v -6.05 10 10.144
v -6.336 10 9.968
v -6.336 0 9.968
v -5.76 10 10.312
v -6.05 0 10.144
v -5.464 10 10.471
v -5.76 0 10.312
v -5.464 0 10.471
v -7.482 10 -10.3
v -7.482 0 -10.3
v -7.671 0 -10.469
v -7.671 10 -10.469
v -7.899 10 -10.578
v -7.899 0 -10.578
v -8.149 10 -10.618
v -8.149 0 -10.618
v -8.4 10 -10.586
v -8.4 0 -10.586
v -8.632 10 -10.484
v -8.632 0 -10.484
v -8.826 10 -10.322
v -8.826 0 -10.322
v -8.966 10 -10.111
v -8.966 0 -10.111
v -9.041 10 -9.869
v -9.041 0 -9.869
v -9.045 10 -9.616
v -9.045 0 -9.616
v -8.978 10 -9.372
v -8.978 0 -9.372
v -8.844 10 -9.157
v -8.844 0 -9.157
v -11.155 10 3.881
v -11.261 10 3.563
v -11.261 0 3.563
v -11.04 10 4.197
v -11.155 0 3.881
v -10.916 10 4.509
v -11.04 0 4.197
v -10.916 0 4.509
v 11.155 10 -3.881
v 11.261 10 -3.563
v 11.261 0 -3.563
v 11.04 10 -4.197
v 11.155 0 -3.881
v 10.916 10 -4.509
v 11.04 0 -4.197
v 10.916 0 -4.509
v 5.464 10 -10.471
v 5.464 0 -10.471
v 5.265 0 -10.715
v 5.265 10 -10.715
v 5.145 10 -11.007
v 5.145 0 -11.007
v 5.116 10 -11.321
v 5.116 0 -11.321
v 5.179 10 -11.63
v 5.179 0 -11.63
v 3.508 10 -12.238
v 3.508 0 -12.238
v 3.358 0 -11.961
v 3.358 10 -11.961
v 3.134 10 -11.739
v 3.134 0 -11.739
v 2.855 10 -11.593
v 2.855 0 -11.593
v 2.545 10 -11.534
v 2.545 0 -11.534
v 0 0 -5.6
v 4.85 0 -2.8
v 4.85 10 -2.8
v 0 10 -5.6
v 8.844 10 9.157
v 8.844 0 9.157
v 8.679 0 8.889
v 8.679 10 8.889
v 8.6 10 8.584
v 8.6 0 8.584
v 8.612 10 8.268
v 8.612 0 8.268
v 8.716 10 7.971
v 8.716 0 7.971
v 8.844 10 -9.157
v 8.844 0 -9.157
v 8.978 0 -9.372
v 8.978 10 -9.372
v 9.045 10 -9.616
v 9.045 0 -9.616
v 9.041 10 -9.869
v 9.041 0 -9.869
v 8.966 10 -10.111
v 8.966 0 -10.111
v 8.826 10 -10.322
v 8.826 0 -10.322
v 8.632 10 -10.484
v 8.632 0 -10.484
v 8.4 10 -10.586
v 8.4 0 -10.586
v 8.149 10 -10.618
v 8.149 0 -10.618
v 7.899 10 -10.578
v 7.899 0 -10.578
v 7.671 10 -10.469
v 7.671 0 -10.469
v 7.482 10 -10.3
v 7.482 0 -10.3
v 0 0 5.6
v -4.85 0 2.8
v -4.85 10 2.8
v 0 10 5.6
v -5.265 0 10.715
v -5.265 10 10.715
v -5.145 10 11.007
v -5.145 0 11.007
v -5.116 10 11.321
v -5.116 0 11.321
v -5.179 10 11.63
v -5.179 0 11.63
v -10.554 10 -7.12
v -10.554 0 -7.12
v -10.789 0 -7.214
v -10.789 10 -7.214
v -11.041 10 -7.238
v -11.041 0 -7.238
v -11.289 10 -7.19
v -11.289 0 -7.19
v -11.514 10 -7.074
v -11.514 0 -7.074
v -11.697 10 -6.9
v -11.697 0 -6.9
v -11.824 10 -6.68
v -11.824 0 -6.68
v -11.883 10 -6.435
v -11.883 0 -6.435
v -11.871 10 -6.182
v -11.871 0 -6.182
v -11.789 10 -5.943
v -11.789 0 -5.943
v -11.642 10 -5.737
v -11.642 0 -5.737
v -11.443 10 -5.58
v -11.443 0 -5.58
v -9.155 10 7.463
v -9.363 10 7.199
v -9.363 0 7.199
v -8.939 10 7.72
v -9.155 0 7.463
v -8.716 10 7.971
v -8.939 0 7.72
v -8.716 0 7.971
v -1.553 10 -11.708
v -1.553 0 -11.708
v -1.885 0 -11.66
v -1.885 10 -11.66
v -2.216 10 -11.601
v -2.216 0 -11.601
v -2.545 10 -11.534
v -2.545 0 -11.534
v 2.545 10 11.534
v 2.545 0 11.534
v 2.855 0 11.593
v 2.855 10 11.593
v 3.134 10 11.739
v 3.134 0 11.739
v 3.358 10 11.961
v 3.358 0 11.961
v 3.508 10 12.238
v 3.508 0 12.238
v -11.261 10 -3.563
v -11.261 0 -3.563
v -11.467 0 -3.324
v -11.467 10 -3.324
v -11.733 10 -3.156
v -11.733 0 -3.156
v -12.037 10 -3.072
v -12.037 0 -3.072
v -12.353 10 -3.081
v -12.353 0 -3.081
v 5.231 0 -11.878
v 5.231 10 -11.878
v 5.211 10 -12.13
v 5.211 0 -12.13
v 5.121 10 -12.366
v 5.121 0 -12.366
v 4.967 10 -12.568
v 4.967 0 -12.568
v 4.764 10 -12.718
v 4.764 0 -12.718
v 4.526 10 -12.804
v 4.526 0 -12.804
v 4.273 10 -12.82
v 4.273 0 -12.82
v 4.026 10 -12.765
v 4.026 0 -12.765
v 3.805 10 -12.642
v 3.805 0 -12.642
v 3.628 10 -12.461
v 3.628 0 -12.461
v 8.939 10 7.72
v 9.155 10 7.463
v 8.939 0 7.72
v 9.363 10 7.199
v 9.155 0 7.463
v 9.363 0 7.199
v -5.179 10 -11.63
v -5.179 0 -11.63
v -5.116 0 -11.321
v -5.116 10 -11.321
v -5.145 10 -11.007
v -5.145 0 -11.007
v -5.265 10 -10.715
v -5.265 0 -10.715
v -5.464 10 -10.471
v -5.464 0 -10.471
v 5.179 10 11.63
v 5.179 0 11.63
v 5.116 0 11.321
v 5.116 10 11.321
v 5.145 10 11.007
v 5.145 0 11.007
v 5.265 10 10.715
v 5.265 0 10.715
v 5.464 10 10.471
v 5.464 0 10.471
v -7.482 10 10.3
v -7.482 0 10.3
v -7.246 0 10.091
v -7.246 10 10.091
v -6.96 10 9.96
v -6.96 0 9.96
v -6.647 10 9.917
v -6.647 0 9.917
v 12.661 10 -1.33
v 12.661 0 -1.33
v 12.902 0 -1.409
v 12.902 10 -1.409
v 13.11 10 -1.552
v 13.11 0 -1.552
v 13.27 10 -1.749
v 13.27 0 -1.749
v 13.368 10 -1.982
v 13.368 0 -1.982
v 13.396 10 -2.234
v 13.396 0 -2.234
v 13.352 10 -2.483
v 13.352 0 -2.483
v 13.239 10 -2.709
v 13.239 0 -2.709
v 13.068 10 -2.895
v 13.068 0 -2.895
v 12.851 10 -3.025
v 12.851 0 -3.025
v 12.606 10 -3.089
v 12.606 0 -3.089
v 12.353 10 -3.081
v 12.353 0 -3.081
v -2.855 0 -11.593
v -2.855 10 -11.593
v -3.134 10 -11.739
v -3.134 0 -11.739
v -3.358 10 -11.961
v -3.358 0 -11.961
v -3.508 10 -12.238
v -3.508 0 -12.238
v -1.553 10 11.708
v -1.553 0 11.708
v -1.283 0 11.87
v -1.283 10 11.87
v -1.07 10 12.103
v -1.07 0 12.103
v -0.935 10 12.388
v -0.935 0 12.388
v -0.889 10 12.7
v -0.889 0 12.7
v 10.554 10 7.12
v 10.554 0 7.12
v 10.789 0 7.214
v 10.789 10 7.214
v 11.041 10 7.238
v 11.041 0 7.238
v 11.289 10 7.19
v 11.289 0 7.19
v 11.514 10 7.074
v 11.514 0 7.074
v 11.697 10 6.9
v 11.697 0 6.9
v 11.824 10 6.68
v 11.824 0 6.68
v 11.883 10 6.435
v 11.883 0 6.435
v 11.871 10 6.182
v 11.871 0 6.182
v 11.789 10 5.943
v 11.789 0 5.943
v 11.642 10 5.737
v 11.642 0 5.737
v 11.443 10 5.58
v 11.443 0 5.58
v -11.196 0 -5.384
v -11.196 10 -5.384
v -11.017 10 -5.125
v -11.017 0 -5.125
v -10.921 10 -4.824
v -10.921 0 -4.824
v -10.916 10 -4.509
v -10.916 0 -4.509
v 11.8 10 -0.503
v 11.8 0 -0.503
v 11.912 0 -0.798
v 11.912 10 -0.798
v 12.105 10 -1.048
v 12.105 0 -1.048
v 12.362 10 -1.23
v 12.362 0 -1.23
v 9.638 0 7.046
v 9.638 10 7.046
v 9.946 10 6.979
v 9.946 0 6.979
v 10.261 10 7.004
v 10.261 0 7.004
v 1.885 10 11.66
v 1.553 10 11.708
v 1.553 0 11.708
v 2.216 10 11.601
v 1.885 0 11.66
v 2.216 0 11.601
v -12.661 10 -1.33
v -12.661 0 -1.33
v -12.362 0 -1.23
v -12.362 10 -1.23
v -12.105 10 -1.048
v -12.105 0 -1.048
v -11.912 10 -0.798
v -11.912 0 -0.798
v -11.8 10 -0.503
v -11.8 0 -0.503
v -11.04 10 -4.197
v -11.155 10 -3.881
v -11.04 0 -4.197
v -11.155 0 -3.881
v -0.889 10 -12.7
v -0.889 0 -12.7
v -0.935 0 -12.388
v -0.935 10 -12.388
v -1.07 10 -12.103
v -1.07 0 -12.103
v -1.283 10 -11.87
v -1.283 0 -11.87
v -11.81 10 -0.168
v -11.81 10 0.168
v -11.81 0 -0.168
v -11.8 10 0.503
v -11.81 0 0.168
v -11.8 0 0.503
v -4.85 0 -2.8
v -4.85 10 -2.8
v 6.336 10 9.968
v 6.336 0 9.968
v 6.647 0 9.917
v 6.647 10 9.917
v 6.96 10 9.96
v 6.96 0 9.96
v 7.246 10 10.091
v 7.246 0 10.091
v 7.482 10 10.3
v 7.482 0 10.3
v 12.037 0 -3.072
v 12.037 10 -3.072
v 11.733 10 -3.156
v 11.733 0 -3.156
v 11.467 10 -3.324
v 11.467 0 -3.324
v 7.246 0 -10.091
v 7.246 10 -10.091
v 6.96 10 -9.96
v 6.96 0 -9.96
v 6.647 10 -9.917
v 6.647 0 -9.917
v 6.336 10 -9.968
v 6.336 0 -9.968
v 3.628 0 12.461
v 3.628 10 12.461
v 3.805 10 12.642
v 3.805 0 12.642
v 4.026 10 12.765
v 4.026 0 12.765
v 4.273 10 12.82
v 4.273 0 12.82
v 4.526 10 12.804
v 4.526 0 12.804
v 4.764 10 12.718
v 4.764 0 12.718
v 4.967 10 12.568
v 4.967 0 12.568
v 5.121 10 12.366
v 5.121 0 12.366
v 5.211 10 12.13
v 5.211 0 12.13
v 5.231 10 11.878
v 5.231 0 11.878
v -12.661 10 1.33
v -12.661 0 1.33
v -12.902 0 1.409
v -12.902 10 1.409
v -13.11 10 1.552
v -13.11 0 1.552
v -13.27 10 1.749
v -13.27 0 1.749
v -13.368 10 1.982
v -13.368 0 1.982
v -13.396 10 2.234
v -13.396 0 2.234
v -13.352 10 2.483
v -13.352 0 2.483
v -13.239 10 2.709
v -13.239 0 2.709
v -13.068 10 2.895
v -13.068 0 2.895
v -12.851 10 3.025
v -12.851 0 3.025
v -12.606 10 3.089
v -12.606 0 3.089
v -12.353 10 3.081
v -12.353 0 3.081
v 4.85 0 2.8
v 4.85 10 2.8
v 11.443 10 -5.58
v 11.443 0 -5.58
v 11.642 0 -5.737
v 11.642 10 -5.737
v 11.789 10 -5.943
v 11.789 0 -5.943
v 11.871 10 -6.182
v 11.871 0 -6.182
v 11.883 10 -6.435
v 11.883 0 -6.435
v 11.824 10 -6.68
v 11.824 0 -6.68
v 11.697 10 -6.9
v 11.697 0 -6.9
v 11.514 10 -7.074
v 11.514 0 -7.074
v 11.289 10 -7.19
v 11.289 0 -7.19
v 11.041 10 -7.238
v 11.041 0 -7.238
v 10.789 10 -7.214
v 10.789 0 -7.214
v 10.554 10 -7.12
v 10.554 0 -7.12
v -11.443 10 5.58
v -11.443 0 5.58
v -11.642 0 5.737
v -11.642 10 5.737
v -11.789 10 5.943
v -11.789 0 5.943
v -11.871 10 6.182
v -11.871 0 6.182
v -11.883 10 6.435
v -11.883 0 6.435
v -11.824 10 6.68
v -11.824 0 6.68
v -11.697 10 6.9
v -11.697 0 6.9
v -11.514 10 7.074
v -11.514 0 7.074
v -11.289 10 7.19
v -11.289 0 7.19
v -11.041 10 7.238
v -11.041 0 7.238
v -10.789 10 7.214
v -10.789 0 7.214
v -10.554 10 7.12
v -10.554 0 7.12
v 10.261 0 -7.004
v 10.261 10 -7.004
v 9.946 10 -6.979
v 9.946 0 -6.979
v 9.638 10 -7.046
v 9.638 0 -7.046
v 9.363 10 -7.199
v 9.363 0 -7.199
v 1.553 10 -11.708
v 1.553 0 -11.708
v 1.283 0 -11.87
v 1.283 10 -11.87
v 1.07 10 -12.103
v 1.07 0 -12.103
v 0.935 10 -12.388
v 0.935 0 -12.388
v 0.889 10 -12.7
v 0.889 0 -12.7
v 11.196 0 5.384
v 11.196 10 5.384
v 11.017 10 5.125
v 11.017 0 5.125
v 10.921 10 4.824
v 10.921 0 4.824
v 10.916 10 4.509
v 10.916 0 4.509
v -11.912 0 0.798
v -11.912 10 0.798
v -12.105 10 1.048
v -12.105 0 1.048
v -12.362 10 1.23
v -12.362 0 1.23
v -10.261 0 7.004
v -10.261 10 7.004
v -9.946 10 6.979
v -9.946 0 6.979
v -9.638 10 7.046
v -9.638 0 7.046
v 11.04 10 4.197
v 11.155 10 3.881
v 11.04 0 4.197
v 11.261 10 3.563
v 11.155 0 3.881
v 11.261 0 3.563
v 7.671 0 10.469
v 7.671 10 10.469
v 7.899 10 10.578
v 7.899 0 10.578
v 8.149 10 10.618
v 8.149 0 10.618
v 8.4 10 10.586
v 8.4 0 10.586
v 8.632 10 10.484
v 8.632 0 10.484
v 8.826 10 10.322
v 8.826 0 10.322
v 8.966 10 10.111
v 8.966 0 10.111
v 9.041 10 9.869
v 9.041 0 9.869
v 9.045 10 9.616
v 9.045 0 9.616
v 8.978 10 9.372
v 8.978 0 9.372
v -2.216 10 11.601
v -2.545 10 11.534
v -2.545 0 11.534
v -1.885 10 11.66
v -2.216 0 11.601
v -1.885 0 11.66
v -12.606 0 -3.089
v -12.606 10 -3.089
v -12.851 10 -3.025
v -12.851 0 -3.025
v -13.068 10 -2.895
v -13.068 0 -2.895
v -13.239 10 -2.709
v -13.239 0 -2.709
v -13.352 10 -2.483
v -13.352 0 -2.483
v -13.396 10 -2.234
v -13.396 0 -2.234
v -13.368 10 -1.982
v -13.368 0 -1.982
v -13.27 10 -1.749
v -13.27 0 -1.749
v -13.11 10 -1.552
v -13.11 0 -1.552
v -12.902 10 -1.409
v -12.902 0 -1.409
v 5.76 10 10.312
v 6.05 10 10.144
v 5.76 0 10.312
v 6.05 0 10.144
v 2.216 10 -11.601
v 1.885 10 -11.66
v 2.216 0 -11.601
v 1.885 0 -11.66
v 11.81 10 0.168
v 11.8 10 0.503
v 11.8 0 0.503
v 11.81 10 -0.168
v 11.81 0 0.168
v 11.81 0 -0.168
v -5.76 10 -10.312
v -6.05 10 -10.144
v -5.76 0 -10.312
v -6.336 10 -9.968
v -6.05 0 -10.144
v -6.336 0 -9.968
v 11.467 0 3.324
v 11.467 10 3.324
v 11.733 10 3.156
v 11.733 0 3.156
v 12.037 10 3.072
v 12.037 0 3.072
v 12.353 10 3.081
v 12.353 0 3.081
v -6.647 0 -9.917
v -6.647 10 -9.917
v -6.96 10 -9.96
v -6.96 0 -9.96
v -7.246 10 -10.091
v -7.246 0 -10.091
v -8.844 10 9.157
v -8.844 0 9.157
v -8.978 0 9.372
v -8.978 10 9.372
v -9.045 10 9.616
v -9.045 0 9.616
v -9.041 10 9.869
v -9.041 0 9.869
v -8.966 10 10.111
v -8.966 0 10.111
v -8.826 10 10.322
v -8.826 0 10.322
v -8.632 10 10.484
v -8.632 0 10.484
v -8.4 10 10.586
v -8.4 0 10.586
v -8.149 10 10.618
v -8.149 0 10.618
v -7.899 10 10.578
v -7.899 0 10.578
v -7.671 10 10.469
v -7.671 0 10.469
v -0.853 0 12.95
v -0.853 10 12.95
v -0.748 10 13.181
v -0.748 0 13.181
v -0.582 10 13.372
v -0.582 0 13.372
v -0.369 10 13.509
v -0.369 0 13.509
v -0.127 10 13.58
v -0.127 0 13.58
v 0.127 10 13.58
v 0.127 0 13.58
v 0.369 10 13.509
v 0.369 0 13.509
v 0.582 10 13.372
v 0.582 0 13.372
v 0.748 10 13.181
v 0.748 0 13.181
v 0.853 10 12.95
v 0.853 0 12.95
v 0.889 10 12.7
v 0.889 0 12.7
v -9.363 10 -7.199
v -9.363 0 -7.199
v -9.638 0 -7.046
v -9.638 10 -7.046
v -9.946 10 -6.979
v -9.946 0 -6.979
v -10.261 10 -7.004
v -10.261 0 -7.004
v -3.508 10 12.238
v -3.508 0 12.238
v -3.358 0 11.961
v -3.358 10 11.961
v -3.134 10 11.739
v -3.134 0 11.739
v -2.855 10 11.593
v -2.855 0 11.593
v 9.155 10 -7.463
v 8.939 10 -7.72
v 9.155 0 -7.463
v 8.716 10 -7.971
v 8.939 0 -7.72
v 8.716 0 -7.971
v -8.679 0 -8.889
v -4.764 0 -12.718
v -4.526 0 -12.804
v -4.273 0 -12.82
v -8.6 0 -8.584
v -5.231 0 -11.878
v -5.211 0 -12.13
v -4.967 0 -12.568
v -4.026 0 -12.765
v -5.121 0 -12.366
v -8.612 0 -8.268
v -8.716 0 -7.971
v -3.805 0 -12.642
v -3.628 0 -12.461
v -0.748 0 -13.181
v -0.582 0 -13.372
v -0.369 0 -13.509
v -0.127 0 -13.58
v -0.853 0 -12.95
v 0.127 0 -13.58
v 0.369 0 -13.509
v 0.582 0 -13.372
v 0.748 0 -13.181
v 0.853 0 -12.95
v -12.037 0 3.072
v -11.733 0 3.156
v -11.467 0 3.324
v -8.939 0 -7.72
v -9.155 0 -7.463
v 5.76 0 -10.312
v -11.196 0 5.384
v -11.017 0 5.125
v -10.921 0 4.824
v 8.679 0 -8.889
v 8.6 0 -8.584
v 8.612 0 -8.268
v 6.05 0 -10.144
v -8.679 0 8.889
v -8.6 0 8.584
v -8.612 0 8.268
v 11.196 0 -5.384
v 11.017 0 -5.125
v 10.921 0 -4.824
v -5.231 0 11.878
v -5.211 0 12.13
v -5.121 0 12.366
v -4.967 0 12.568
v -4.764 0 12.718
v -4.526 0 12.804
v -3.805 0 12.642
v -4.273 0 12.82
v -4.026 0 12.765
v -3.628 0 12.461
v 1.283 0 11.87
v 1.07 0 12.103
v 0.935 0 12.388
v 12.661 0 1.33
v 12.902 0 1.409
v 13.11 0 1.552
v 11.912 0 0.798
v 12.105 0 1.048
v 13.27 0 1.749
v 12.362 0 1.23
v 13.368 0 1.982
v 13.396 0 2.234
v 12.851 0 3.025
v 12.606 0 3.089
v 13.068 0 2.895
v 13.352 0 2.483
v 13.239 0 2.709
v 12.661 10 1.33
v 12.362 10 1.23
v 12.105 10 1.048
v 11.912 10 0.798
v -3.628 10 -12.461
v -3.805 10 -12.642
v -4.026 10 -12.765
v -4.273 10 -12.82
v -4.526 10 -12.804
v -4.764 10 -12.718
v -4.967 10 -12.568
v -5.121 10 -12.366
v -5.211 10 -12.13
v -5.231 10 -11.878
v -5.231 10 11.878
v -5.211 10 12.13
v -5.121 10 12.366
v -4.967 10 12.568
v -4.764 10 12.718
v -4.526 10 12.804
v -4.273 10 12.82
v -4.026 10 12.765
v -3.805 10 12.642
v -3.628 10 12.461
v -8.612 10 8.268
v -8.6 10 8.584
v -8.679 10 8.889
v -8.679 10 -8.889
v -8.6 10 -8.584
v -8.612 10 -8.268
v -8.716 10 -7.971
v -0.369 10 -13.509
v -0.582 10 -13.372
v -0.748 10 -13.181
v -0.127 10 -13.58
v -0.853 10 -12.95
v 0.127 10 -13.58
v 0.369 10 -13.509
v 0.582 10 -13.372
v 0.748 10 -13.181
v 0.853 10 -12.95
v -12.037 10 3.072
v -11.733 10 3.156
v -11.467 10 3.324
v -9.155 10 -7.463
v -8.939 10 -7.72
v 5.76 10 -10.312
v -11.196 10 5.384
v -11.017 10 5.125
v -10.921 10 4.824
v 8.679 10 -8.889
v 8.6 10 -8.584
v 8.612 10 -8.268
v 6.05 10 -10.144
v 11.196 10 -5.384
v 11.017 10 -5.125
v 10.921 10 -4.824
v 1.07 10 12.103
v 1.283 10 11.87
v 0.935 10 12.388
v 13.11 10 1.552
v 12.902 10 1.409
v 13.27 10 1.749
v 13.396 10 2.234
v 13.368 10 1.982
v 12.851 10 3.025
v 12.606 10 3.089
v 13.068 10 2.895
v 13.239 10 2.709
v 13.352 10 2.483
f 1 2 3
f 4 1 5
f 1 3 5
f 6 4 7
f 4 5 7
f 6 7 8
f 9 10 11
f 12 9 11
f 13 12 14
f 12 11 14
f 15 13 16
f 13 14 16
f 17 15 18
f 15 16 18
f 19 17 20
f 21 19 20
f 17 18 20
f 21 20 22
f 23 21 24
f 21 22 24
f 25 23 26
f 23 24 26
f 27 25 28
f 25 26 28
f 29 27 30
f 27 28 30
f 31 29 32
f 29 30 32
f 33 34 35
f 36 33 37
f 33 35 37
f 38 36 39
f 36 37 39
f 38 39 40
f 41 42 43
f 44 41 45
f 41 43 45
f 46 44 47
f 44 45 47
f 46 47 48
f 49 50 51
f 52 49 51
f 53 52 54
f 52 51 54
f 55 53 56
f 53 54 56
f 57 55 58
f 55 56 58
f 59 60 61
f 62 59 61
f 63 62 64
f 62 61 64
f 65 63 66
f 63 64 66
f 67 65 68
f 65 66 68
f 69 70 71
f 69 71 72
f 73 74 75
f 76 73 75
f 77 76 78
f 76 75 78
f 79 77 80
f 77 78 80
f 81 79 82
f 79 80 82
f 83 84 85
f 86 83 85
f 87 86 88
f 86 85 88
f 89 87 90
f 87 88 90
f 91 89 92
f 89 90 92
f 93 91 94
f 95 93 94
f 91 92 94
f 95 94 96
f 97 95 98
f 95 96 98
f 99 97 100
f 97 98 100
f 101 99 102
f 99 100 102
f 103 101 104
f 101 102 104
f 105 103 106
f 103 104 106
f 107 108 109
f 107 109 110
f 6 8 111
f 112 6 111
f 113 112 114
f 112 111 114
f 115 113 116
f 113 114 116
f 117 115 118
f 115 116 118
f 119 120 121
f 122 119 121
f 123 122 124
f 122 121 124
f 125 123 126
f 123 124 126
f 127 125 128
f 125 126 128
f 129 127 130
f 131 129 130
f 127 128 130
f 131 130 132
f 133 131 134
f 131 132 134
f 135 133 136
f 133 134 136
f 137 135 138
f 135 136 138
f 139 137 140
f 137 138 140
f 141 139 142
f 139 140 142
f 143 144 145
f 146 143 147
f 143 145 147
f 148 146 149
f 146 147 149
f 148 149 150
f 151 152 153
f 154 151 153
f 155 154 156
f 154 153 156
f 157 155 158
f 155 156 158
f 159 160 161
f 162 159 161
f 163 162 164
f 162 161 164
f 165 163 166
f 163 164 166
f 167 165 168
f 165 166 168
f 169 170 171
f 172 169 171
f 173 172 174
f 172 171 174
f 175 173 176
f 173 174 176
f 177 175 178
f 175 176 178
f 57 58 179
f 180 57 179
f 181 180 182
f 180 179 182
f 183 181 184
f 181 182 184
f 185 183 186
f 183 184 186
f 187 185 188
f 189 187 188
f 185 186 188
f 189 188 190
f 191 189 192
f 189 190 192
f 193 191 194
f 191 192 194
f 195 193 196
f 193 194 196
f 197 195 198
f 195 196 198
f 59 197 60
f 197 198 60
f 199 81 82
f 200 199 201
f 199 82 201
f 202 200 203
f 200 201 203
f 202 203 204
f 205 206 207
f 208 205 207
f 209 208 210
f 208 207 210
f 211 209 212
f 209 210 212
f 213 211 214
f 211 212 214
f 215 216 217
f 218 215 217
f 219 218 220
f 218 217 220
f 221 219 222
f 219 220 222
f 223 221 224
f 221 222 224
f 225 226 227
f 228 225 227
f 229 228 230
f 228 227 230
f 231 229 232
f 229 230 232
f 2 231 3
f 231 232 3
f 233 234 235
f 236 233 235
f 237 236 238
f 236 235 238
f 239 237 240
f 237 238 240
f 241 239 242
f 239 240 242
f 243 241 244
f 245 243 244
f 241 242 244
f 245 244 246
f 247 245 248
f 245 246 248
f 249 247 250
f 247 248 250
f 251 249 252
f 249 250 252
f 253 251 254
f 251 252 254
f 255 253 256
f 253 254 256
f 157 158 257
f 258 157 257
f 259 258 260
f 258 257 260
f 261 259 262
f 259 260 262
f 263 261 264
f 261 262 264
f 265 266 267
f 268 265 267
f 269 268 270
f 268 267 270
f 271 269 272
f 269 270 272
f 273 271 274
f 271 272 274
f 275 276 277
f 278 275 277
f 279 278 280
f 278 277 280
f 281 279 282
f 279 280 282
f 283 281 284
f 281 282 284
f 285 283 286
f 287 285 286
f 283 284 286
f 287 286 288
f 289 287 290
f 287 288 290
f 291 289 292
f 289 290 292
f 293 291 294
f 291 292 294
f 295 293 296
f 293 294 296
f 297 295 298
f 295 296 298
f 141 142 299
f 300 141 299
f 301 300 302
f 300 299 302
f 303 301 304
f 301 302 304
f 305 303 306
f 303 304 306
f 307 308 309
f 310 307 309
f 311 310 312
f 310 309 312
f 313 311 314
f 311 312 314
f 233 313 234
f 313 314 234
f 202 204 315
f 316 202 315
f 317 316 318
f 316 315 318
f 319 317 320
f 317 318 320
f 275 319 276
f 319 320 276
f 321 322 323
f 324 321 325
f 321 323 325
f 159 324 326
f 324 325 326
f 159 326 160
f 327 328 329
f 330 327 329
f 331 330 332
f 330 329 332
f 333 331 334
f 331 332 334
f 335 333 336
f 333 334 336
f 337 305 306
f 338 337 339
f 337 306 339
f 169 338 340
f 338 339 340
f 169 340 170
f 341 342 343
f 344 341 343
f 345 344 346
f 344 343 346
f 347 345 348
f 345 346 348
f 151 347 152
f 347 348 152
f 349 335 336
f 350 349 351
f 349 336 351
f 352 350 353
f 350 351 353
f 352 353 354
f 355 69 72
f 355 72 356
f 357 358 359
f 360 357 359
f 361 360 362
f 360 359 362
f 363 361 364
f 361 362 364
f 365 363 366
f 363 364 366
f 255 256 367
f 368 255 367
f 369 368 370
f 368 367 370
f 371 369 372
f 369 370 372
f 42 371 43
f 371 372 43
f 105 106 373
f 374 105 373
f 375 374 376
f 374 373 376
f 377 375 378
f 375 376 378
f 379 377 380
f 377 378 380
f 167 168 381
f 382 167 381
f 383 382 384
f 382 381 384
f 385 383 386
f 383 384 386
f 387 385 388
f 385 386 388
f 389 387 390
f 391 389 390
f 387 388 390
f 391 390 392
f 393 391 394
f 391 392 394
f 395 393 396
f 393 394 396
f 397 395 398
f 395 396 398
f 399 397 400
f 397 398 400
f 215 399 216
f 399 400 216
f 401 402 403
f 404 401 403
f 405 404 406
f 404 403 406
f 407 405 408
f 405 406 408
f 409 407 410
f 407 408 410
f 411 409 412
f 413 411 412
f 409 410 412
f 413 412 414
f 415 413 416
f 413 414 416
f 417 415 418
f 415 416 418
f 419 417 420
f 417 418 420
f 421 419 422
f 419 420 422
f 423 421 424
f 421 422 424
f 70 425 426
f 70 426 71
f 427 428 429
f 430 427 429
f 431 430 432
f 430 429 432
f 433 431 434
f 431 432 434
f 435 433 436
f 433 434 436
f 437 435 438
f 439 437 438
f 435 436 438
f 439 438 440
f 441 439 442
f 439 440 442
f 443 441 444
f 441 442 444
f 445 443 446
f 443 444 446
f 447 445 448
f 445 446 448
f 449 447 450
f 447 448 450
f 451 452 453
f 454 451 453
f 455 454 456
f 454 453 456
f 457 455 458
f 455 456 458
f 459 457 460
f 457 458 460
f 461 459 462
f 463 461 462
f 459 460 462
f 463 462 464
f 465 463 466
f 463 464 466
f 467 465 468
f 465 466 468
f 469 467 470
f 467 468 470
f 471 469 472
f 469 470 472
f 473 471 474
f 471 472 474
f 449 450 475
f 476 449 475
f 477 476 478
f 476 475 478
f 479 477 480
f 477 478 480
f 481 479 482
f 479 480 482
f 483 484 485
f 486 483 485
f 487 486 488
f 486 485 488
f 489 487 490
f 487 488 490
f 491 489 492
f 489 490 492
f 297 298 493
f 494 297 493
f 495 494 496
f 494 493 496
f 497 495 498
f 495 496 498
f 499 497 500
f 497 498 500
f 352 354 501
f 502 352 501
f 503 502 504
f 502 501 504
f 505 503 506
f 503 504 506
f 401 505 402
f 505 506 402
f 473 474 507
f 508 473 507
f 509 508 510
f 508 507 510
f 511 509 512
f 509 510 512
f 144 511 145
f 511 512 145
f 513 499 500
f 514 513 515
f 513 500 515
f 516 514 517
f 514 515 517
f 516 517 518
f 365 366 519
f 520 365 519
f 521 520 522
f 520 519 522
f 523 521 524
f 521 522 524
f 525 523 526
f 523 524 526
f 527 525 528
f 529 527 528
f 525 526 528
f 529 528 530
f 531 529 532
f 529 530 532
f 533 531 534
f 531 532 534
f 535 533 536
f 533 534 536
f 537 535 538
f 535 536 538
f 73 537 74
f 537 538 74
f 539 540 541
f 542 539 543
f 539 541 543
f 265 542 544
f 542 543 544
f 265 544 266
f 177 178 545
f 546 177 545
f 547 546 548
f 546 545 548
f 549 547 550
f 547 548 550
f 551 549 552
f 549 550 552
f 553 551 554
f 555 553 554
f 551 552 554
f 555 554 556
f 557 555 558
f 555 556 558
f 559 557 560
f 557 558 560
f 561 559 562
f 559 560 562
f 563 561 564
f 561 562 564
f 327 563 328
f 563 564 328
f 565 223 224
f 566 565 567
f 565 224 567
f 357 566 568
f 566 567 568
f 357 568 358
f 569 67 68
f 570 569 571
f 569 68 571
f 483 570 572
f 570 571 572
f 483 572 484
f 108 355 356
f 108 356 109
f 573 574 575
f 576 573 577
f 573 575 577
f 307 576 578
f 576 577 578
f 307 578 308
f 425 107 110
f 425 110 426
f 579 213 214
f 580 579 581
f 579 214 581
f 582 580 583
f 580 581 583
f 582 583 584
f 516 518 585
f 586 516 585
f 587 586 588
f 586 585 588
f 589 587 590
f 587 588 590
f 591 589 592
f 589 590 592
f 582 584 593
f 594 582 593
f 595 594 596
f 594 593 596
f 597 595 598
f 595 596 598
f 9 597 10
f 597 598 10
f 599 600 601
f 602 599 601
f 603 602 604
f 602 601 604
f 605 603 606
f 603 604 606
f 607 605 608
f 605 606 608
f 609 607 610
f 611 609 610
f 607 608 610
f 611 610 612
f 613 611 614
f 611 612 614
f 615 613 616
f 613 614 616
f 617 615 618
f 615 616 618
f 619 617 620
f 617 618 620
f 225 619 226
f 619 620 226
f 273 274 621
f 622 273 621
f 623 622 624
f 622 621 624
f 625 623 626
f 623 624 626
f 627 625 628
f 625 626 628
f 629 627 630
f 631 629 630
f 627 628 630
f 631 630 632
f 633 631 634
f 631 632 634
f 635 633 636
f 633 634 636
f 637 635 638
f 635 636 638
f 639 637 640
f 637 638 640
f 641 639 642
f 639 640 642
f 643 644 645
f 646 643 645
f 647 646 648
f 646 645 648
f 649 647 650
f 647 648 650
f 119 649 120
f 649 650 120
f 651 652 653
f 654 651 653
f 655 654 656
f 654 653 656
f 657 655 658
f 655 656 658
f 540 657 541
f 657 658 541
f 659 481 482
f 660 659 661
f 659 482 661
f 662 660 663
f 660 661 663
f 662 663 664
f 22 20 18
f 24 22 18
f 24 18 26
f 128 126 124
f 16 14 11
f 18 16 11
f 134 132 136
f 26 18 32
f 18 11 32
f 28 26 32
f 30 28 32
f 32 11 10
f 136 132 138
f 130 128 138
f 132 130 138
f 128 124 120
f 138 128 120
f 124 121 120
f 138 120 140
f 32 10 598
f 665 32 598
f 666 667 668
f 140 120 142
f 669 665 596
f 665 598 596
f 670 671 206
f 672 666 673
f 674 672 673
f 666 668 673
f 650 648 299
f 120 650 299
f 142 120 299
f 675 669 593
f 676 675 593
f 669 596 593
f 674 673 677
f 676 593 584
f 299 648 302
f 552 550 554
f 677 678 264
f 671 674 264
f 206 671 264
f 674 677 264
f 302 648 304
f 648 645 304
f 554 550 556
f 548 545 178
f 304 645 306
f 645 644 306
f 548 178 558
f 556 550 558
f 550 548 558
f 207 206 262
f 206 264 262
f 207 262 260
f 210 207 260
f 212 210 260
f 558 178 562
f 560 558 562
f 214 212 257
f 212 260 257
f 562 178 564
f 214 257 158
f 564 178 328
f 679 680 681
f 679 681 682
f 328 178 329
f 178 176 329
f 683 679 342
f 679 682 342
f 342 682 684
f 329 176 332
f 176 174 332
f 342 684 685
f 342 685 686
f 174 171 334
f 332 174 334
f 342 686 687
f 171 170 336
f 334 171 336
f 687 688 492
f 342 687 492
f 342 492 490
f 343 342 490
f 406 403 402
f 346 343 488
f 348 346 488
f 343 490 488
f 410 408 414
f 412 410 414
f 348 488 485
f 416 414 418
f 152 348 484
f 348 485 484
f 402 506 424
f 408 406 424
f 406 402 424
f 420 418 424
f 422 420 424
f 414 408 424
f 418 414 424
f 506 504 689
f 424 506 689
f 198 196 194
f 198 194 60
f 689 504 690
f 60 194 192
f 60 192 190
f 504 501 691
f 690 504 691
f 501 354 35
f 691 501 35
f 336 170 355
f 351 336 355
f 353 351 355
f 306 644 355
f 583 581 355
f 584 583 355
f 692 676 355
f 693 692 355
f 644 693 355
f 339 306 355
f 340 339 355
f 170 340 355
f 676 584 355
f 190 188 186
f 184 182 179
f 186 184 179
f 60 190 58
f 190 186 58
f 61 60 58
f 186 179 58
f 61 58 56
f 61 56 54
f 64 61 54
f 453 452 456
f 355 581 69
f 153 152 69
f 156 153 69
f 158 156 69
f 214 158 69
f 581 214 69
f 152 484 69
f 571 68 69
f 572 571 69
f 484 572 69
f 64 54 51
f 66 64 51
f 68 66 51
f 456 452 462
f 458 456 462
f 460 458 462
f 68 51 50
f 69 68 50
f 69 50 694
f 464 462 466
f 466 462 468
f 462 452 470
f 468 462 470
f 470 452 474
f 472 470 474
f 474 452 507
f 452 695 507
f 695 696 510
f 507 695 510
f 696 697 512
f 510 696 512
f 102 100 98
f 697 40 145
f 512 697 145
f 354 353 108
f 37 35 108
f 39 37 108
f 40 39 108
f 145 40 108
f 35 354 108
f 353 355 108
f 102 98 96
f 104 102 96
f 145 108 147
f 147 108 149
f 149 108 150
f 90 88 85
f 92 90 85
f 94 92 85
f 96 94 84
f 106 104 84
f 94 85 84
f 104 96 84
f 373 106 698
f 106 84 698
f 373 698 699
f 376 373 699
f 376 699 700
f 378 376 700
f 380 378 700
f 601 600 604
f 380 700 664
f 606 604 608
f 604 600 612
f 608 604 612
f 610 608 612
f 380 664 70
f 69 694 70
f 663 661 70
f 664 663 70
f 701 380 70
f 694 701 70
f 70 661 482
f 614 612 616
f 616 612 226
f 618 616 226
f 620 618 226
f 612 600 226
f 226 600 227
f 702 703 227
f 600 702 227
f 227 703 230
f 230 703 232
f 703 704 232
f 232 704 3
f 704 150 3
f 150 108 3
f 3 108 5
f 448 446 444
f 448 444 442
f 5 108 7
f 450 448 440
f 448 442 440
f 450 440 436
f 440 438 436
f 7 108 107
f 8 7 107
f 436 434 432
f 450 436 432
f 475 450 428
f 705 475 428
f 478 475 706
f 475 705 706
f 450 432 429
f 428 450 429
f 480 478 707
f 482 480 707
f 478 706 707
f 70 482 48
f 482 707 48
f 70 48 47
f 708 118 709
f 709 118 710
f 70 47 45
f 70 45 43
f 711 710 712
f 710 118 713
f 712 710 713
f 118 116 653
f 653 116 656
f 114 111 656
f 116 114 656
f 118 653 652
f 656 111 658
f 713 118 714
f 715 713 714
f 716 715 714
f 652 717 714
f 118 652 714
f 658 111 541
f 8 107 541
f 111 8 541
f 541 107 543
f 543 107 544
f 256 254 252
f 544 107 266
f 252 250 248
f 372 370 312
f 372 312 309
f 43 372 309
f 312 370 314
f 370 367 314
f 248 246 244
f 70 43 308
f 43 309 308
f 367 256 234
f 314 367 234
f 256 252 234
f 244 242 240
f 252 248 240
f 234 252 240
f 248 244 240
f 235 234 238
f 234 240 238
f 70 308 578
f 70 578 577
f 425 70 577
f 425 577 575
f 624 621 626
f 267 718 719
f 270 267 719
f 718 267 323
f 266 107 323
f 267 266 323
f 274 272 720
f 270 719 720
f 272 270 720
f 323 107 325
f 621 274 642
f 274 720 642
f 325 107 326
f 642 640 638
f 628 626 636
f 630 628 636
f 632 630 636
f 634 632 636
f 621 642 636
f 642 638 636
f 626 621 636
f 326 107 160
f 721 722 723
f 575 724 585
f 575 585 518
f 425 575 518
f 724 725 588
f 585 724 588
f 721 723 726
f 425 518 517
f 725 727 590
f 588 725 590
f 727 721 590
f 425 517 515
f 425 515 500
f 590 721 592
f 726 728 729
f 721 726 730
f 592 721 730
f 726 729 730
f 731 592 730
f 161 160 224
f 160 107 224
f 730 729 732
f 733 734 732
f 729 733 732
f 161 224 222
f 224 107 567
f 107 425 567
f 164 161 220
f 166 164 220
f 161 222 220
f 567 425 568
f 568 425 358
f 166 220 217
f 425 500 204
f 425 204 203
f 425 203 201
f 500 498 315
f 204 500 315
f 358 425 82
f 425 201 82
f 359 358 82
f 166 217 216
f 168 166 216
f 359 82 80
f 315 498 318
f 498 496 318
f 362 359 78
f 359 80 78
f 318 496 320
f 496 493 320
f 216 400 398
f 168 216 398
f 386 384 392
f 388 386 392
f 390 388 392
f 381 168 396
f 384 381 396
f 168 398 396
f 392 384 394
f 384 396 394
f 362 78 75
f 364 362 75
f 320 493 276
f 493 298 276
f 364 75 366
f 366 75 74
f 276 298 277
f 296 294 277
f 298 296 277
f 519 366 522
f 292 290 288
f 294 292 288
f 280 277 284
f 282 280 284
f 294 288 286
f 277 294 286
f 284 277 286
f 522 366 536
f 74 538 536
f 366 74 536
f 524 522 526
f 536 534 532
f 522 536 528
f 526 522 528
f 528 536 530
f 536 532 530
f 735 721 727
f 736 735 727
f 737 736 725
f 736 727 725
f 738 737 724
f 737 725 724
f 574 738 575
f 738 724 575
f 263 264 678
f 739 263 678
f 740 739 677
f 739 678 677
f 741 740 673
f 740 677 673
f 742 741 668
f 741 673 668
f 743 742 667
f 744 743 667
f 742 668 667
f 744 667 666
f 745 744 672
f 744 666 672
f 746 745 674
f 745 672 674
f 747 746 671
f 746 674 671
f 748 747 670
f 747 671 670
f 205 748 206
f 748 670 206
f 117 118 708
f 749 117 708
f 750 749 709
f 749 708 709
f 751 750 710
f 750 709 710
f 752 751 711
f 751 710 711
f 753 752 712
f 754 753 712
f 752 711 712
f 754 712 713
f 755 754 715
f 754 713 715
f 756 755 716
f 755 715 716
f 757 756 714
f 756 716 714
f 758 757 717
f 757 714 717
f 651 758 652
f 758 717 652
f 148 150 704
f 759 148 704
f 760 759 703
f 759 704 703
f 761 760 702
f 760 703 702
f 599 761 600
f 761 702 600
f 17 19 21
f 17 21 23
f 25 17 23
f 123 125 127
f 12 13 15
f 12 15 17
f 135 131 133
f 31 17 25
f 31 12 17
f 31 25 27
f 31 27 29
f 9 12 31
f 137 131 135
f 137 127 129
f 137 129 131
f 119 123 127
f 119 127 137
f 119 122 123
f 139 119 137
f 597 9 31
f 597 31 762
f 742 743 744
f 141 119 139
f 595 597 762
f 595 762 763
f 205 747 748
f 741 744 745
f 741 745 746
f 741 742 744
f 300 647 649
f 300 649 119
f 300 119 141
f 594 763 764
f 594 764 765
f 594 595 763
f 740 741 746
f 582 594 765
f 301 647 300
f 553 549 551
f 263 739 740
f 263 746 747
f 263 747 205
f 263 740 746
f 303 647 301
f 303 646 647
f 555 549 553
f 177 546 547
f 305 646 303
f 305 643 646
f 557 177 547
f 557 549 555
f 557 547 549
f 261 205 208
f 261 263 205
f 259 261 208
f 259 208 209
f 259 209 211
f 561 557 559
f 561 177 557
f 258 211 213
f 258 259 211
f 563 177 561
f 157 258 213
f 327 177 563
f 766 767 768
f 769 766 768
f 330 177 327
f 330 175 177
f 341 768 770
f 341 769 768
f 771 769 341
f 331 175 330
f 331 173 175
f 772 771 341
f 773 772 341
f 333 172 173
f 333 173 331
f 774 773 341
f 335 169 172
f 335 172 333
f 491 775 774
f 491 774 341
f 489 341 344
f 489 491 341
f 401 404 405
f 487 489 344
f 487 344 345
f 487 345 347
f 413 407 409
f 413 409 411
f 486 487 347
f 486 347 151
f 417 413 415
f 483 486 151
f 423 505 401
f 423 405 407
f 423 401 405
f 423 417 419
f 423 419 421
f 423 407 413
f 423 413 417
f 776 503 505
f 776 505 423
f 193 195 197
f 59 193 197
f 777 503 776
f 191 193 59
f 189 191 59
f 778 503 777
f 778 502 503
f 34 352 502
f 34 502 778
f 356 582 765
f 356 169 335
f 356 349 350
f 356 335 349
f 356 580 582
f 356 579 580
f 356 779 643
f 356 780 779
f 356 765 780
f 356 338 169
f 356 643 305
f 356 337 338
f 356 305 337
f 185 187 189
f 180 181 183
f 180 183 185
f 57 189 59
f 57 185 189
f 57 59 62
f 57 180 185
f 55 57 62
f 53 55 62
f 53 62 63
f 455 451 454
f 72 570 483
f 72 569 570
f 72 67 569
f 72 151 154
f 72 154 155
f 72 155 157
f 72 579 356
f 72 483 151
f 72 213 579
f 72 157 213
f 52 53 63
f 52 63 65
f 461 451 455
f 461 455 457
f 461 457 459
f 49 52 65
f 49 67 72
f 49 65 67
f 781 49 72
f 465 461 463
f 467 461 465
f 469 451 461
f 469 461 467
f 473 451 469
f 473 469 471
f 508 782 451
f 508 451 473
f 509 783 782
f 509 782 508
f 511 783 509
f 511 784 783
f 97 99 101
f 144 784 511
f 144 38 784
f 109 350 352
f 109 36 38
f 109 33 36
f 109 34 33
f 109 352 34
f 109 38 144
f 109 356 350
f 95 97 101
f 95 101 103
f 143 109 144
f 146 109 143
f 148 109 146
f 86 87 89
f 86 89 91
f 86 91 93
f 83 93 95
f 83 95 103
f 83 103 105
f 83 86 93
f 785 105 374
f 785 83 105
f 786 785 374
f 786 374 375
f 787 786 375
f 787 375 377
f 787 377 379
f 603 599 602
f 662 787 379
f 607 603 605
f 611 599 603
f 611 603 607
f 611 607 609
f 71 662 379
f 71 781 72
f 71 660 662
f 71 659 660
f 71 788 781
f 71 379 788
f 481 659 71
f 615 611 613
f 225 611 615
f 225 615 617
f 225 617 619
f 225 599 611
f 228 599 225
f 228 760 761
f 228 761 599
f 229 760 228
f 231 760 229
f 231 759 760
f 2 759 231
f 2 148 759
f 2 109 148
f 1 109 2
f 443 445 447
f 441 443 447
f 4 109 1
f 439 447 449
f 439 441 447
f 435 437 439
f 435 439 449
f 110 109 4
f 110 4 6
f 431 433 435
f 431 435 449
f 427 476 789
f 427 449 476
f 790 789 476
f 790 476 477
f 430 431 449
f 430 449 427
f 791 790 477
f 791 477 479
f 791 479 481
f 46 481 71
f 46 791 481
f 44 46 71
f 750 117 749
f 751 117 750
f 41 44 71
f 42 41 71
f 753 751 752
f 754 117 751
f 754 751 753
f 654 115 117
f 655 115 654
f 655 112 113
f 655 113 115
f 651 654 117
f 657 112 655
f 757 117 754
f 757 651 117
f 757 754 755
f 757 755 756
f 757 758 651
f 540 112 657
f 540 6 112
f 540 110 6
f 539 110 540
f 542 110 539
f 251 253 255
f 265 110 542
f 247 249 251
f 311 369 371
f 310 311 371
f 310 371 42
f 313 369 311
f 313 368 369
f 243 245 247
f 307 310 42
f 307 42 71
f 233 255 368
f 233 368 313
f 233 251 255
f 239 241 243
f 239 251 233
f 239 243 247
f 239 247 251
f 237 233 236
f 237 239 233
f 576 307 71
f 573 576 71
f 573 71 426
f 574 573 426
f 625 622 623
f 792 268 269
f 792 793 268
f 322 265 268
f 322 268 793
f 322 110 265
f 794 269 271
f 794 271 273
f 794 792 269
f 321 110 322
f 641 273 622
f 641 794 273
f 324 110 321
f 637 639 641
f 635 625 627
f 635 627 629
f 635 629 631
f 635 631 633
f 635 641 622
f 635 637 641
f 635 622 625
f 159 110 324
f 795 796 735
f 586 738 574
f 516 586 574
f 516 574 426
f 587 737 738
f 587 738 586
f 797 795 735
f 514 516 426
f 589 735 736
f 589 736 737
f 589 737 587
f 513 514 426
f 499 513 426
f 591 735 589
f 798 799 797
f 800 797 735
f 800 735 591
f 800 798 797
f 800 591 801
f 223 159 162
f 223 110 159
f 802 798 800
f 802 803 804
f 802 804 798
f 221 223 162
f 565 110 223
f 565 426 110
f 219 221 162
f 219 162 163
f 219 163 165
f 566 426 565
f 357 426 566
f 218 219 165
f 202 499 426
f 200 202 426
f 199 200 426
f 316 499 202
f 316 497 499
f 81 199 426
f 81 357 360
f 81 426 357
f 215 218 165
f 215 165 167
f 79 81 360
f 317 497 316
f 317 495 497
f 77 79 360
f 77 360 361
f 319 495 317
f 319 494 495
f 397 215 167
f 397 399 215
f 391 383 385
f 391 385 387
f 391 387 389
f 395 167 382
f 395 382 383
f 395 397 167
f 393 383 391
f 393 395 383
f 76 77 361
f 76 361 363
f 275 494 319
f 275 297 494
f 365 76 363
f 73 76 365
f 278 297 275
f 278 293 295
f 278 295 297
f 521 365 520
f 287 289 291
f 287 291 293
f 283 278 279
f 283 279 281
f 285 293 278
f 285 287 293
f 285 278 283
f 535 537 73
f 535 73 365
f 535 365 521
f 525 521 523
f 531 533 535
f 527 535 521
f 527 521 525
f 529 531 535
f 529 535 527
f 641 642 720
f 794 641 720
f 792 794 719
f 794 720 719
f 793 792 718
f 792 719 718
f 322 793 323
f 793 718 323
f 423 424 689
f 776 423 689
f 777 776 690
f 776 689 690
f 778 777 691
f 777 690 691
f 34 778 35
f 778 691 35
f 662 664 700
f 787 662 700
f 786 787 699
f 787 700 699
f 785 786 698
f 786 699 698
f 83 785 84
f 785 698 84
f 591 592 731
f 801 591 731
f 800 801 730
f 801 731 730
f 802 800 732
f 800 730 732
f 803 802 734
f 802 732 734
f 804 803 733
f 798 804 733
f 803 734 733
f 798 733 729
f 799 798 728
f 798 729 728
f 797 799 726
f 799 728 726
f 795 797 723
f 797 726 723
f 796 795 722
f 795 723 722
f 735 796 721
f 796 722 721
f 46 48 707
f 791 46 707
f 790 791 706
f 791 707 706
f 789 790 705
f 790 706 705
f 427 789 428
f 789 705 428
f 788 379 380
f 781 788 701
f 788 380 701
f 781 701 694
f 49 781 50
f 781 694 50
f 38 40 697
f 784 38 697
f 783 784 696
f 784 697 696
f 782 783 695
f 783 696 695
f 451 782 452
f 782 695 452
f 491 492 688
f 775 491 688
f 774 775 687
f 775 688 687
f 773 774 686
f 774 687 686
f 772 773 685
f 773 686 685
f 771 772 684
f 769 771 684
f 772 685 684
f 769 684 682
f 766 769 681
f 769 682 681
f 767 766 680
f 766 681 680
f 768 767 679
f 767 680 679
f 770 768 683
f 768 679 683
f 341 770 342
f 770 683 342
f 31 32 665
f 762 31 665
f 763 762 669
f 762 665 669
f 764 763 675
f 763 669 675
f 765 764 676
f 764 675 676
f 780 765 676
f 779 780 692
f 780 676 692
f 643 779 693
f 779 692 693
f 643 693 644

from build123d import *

# Parameters (mm, degrees)
SKETCH1_R           = 11.811
BOSS_EXTRUDE1_DEPTH = 10
BOSS_EXTRUDE2_START = -10
BOSS_EXTRUDE2_DEPTH = 10
CIRPATTERN1_COUNT   = 18


with BuildPart() as part:
    # Sketch1 → Boss-Extrude1 (new body)
    with BuildSketch(Plane(origin=(0, 0, 0), x_dir=(1, 0, 0), z_dir=(0, 1, 0))):
        with Locations(Location((0, 0, 0), (0, 0, 270))):
            Circle(SKETCH1_R)
        Polygon((0, 5.600297611), (-4.85, 2.800148806), (-4.85, -2.800148806), (0, -5.600297611), (4.85, -2.800148806), (4.85, 2.800148806), align=None, mode=Mode.SUBTRACT)
    extrude(amount=BOSS_EXTRUDE1_DEPTH)

    # Sketch2 → Boss-Extrude2 (add)
    with BuildSketch(Plane(origin=(0, 10, 0), x_dir=(1, 0, 0), z_dir=(0, 1, 0)).offset(BOSS_EXTRUDE2_START)):
        with BuildLine():
            ThreePointArc((0.889, 12.7), (0, 13.589), (-0.889, 12.7))
            ThreePointArc((-0.889, 12.7), (-1.070430373, 12.103223599), (-1.553320634, 11.70841219))
            ThreePointArc((-1.553320634, 11.70841219), (0, 11.811), (1.553320634, 11.70841219))
            ThreePointArc((1.553320634, 11.70841219), (1.070430373, 12.103223599), (0.889, 12.7))
        make_face()
    boss_extrude2 = extrude(amount=BOSS_EXTRUDE2_DEPTH)

    # CirPattern1: Boss-Extrude2 ×18 about axis
    cirpattern1_axis = Axis((0, 0, 0), (0, 1, 0))
    for i in range(1, CIRPATTERN1_COUNT):
        add(boss_extrude2.rotate(cirpattern1_axis, i * 360 / CIRPATTERN1_COUNT))


solid = part.part
